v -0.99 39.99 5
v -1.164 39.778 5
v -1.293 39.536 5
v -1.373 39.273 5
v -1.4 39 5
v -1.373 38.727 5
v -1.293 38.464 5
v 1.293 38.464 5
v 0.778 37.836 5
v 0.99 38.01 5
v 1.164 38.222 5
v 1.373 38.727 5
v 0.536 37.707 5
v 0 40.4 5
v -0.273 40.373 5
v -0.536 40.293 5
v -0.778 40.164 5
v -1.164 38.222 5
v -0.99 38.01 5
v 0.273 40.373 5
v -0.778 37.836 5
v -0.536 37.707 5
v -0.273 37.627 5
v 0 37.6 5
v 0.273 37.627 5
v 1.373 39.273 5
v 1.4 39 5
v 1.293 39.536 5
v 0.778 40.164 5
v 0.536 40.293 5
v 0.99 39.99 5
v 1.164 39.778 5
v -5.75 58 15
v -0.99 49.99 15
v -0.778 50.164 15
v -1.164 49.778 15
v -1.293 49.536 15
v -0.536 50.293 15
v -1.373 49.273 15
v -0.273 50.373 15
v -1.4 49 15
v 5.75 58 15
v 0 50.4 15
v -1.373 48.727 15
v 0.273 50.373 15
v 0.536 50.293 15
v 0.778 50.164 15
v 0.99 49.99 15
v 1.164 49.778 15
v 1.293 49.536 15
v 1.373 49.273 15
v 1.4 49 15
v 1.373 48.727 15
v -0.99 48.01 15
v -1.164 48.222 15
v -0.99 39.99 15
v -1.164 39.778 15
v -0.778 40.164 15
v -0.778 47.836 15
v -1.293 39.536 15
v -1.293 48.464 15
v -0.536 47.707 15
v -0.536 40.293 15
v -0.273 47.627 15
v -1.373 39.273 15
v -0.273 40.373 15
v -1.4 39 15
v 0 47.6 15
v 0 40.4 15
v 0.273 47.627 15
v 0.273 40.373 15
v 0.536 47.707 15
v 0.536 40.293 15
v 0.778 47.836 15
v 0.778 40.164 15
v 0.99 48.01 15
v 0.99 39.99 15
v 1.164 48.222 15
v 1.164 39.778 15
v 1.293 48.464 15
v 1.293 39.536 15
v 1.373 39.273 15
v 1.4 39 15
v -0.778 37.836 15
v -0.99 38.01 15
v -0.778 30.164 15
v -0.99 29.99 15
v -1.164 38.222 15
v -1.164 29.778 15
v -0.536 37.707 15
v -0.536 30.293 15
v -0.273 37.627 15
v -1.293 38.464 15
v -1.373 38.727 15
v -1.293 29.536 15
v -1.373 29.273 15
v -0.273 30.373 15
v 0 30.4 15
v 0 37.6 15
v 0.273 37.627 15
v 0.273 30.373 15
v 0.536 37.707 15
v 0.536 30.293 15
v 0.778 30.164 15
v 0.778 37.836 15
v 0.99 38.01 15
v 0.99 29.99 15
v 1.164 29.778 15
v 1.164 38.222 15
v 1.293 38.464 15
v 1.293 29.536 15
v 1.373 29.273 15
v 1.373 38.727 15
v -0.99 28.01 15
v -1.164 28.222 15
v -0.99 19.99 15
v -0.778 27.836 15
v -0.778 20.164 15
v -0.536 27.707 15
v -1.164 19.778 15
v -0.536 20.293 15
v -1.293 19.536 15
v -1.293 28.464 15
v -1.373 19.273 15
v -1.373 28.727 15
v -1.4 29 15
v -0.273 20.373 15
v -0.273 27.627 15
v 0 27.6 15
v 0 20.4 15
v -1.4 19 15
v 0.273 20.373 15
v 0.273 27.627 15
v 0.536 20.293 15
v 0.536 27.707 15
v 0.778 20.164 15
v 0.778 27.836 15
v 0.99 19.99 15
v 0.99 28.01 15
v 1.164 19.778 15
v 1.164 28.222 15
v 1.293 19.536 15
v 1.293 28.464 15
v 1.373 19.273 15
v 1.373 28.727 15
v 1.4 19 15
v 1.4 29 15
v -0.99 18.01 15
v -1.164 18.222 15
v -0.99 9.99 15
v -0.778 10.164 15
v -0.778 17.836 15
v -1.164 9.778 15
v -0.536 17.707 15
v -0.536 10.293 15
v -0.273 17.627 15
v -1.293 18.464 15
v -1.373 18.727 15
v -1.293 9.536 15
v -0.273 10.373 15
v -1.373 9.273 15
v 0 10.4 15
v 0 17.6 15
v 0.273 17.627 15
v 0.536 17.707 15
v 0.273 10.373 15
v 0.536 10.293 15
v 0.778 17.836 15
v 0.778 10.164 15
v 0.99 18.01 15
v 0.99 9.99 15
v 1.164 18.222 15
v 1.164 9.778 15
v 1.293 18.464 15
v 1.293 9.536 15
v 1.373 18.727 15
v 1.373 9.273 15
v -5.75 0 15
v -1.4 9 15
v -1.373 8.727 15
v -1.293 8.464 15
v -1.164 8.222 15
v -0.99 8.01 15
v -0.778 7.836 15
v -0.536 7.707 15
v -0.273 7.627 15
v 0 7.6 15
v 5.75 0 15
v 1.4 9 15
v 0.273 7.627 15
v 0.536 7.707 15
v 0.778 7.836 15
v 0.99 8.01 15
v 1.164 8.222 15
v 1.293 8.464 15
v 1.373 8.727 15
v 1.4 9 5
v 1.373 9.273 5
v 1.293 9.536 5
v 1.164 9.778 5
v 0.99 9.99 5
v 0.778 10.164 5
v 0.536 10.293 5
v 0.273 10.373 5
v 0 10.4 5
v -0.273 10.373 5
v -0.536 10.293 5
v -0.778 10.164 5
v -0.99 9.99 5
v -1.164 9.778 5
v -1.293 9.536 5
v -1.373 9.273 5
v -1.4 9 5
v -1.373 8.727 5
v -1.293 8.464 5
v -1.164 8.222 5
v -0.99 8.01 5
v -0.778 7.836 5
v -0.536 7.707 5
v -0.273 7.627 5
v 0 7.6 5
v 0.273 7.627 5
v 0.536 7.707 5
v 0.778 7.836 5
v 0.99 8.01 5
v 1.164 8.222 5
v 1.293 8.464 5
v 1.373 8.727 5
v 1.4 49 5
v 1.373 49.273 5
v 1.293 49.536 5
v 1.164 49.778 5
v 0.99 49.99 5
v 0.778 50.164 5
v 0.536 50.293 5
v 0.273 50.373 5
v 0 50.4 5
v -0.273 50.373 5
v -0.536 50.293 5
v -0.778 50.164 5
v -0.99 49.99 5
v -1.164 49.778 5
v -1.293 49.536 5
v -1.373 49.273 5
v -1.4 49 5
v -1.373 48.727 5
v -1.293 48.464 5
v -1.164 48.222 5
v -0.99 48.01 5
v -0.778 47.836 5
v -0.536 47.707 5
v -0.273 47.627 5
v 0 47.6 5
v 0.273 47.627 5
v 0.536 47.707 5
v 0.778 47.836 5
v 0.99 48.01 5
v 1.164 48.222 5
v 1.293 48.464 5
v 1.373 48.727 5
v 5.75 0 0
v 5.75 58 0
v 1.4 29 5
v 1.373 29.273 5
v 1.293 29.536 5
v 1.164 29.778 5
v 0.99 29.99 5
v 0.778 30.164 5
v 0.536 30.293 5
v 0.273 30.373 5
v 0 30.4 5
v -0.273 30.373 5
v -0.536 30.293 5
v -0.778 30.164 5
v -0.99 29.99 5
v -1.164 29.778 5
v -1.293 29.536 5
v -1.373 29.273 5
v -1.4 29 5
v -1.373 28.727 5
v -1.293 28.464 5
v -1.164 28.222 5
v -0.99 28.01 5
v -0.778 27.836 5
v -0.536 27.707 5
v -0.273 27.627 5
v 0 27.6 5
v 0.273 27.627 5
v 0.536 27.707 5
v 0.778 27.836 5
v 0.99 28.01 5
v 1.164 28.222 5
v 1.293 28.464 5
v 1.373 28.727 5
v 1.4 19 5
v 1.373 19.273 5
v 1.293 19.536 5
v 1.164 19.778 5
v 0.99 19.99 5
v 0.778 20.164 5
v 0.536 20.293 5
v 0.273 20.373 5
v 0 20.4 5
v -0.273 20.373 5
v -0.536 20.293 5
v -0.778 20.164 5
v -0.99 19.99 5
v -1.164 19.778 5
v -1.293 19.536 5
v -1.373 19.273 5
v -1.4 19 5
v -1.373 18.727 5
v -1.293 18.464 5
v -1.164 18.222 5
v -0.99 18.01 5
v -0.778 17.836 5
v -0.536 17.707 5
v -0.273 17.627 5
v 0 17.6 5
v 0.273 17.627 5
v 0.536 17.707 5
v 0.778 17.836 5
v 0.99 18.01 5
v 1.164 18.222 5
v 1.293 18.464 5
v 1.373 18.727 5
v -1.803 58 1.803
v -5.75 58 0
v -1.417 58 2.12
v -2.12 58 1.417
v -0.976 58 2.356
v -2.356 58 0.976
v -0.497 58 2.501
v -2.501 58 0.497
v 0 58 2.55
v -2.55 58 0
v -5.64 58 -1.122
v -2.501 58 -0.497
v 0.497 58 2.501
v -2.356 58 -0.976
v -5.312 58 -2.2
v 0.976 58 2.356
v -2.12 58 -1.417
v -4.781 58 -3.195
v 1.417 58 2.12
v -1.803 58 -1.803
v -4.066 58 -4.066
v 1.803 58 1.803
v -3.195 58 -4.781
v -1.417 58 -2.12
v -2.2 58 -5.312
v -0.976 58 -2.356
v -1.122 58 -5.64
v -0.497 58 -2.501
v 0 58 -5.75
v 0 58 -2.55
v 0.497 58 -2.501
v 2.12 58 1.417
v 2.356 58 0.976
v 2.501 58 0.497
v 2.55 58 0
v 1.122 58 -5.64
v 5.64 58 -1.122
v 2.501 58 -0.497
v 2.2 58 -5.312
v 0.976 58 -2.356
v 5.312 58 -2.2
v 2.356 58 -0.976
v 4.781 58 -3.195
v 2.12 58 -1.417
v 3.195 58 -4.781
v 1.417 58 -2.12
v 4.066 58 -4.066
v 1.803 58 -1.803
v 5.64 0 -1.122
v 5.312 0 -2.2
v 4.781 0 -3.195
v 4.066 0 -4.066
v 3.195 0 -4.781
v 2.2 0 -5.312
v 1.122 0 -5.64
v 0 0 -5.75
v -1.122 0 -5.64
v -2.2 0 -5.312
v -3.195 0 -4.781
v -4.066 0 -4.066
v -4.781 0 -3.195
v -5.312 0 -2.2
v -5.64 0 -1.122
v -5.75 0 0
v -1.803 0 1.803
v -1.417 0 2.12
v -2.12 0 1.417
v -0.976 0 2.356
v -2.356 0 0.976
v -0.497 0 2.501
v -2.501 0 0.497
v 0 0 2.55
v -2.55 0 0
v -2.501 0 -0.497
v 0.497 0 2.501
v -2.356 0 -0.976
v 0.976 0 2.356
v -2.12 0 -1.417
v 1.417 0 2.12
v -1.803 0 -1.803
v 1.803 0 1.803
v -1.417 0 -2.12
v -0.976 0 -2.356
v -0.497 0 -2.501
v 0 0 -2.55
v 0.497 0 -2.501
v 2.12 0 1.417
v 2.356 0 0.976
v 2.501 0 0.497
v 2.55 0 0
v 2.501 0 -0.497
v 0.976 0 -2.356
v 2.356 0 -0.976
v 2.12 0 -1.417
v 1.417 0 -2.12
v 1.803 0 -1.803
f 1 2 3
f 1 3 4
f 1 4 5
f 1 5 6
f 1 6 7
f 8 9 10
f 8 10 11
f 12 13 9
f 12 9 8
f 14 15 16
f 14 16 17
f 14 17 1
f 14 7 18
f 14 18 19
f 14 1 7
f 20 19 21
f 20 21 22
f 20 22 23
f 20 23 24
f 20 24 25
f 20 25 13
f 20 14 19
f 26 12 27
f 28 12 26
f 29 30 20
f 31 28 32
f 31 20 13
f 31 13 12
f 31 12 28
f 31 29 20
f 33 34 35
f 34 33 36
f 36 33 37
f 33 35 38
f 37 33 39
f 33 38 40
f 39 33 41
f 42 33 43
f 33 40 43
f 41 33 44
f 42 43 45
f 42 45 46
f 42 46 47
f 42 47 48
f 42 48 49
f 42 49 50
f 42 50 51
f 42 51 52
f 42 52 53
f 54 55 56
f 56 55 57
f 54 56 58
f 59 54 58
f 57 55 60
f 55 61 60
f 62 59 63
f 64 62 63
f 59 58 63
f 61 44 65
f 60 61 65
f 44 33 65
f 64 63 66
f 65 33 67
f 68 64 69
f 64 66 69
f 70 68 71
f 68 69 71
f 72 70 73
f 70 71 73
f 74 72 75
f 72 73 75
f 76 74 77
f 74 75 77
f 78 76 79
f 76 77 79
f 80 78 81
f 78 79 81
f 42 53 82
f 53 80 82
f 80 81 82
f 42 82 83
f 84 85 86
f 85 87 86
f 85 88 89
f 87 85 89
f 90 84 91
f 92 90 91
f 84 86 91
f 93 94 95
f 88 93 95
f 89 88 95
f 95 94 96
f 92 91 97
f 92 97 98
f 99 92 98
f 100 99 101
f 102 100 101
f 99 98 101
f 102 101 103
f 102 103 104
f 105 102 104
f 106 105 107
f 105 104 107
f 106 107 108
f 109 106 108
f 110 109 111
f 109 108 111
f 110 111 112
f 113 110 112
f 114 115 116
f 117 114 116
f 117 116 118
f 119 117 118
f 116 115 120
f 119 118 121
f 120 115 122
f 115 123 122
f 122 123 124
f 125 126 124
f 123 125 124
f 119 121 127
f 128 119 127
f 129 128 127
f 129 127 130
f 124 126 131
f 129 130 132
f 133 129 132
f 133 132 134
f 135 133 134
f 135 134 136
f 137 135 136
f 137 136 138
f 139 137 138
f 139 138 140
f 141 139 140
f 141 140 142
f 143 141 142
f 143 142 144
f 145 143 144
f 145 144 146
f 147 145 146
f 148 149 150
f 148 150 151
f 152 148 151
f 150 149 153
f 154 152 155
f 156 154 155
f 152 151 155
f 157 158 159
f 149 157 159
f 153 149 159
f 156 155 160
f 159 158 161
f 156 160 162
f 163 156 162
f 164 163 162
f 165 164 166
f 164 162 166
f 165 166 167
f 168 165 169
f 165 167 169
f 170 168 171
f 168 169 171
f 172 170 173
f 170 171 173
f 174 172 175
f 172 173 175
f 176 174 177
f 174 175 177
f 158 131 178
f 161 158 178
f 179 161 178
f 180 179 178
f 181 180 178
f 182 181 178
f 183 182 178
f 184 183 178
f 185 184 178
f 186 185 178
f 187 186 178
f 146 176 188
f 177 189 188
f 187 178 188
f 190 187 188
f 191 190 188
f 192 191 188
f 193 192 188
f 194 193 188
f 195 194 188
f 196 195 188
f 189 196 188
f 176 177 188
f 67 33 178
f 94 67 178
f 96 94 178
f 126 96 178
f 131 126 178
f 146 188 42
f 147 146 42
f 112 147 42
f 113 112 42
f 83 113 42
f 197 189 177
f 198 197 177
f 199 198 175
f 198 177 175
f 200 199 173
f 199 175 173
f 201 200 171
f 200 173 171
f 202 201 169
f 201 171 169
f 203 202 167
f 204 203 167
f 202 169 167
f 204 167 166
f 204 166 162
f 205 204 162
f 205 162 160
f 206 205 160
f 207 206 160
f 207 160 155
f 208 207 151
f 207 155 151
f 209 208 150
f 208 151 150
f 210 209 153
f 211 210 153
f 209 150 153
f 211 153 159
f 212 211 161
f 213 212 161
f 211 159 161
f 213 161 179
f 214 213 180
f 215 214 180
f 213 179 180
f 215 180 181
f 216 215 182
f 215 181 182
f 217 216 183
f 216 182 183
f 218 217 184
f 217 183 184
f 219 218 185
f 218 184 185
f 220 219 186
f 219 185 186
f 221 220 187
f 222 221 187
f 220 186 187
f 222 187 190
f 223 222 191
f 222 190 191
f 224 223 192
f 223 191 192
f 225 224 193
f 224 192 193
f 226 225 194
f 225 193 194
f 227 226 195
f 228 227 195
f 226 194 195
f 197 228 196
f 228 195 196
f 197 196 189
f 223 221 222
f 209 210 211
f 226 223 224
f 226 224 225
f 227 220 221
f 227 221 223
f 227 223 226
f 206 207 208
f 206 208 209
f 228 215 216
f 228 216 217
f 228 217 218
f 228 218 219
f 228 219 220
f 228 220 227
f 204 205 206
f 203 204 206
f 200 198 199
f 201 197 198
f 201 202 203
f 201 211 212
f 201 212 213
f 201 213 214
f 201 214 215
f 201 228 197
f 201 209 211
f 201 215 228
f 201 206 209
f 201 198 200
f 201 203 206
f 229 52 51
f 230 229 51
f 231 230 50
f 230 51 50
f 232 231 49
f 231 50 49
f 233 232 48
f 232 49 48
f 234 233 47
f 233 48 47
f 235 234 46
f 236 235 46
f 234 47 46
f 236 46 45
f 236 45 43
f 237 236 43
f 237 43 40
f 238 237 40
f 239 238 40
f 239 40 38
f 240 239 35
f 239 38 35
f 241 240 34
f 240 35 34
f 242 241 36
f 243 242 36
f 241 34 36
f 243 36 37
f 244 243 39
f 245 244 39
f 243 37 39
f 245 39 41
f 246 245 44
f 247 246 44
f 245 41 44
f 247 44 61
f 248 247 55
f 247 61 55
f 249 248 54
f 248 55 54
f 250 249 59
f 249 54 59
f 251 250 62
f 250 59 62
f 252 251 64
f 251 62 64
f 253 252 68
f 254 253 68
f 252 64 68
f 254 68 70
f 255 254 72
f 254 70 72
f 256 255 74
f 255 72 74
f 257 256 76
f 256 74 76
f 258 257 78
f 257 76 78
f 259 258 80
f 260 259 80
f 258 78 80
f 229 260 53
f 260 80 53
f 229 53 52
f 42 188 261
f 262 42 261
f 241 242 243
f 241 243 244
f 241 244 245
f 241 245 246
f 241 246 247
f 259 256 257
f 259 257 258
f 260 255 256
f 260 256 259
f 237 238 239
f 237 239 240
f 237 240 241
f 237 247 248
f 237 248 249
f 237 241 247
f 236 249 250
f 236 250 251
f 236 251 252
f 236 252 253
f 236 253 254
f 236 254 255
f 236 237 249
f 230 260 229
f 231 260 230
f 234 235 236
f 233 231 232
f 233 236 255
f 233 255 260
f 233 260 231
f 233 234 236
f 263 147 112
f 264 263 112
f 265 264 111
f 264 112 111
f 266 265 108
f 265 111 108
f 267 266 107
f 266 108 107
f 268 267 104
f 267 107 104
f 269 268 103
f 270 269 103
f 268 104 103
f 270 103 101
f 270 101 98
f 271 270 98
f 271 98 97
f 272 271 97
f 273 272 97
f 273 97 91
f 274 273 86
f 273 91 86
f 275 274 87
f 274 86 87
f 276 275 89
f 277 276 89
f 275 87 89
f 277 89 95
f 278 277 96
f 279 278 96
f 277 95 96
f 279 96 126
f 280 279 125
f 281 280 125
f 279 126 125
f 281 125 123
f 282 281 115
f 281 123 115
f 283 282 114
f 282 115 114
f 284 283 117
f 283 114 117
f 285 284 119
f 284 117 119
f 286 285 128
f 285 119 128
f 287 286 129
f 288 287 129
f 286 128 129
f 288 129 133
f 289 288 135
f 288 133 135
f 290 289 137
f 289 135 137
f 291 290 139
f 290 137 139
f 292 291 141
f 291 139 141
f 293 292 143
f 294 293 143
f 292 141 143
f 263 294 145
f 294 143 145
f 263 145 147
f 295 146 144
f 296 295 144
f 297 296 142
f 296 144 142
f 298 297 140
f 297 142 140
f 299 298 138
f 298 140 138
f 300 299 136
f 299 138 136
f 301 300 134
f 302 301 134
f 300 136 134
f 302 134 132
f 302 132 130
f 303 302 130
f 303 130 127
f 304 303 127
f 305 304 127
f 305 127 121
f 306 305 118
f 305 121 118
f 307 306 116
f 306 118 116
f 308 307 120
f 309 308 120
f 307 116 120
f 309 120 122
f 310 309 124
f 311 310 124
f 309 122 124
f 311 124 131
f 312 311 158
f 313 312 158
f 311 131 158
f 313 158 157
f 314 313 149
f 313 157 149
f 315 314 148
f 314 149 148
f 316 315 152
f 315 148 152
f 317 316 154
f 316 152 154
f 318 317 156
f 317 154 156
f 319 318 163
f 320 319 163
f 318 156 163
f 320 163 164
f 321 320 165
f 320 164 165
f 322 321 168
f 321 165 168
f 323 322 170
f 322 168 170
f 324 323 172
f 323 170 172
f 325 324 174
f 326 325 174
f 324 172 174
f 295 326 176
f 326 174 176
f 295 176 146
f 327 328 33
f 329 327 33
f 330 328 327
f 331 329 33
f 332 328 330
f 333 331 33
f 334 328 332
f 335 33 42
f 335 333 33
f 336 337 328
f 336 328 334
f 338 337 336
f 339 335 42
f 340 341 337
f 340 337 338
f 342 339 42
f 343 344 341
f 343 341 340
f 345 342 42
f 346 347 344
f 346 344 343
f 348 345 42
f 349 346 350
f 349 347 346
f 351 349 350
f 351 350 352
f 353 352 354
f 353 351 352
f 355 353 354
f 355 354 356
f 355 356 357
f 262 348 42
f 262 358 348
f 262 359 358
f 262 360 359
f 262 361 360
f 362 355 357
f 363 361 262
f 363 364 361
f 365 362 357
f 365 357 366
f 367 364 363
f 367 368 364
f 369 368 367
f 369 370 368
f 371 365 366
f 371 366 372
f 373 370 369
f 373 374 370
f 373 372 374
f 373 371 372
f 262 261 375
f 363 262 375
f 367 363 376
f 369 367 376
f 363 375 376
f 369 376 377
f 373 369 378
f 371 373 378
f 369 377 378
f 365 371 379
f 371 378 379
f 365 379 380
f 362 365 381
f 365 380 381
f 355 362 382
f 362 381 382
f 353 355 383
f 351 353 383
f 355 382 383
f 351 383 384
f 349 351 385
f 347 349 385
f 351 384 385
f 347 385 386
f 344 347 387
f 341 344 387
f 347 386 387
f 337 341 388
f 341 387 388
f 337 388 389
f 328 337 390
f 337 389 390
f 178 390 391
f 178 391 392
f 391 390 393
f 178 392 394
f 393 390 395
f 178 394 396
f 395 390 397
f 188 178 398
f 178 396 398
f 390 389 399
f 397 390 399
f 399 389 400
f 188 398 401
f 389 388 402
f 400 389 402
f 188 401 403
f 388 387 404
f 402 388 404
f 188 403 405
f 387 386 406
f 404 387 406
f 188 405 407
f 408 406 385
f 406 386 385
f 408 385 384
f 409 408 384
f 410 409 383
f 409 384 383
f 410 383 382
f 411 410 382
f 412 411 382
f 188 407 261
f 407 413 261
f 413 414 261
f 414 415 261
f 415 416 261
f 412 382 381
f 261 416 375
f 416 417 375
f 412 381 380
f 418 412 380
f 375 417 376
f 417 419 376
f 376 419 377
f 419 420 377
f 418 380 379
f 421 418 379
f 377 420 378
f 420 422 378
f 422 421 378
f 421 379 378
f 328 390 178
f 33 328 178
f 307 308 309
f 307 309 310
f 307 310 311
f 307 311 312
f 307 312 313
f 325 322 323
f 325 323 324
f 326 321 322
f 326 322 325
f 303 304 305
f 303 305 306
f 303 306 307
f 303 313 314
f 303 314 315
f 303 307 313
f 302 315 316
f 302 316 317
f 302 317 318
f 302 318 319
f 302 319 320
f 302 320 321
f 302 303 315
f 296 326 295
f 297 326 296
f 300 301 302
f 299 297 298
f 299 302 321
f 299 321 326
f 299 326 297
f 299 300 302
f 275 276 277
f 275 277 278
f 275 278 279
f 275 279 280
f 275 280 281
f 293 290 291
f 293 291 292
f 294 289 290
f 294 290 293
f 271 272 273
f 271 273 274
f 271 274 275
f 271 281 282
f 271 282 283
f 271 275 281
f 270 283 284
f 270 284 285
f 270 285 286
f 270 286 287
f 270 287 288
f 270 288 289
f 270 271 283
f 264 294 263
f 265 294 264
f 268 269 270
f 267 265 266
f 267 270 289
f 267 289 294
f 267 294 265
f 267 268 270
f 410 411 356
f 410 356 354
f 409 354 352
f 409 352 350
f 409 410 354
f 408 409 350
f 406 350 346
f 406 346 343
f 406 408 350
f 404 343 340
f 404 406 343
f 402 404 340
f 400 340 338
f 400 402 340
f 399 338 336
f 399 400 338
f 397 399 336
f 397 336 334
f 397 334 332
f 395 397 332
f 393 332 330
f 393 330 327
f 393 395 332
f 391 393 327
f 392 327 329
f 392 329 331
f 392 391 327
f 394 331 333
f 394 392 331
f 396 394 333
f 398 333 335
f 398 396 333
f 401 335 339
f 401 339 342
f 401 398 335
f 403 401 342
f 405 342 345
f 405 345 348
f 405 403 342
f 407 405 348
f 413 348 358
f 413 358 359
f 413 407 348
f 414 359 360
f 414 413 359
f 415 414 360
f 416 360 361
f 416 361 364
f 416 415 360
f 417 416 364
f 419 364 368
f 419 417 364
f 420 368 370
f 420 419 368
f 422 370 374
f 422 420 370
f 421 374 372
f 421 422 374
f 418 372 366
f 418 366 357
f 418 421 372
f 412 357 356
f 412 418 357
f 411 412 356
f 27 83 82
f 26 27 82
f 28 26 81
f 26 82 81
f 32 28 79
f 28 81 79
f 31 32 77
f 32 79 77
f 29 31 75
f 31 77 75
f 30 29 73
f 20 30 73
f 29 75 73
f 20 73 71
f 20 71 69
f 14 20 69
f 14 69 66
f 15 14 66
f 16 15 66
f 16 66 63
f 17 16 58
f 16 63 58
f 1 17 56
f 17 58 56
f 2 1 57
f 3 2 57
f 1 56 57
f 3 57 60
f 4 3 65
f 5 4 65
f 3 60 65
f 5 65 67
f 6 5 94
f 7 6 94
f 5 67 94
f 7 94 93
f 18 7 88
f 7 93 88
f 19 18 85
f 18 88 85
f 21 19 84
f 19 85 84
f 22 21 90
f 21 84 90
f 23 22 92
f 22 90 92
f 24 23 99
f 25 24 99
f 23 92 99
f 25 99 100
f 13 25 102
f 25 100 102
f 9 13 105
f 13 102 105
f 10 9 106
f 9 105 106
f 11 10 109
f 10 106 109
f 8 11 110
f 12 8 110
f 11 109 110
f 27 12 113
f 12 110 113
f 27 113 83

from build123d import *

# Parameters (mm, degrees)
SKETCH1_R           = 2.55
BOSS_EXTRUDE1_DEPTH = 58
SKETCH2_R           = 1.4
CUT_EXTRUDE1_DEPTH  = 10


with BuildPart() as part:
    # Sketch1 → Boss-Extrude1 (new body)
    with BuildSketch(Plane(origin=(0, 0, 0), x_dir=(1, 0, 0), z_dir=(0, 1, 0))):
        with BuildLine():
            Line((-5.75, 0), (-5.75, -15))
            Line((-5.75, -15), (5.75, -15))
            Line((5.75, -15), (5.75, 0))
            ThreePointArc((5.75, 0), (0, 5.75), (-5.75, 0))
        make_face()
        with Locations(Location((0, 0, 0), (0, 0, 90))):
            Circle(SKETCH1_R, mode=Mode.SUBTRACT)
    extrude(amount=BOSS_EXTRUDE1_DEPTH)

    # Sketch2 → Cut-Extrude1 (cut)
    with BuildSketch(Plane.XY.offset(15)):
        with Locations((0, 49)):
            Circle(SKETCH2_R)
        with Locations((0, 39)):
            Circle(SKETCH2_R)
        with Locations((0, 29)):
            Circle(SKETCH2_R)
        with Locations((0, 19)):
            Circle(SKETCH2_R)
        with Locations((0, 9)):
            Circle(SKETCH2_R)
    extrude(amount=-CUT_EXTRUDE1_DEPTH, mode=Mode.SUBTRACT)


solid = part.part
